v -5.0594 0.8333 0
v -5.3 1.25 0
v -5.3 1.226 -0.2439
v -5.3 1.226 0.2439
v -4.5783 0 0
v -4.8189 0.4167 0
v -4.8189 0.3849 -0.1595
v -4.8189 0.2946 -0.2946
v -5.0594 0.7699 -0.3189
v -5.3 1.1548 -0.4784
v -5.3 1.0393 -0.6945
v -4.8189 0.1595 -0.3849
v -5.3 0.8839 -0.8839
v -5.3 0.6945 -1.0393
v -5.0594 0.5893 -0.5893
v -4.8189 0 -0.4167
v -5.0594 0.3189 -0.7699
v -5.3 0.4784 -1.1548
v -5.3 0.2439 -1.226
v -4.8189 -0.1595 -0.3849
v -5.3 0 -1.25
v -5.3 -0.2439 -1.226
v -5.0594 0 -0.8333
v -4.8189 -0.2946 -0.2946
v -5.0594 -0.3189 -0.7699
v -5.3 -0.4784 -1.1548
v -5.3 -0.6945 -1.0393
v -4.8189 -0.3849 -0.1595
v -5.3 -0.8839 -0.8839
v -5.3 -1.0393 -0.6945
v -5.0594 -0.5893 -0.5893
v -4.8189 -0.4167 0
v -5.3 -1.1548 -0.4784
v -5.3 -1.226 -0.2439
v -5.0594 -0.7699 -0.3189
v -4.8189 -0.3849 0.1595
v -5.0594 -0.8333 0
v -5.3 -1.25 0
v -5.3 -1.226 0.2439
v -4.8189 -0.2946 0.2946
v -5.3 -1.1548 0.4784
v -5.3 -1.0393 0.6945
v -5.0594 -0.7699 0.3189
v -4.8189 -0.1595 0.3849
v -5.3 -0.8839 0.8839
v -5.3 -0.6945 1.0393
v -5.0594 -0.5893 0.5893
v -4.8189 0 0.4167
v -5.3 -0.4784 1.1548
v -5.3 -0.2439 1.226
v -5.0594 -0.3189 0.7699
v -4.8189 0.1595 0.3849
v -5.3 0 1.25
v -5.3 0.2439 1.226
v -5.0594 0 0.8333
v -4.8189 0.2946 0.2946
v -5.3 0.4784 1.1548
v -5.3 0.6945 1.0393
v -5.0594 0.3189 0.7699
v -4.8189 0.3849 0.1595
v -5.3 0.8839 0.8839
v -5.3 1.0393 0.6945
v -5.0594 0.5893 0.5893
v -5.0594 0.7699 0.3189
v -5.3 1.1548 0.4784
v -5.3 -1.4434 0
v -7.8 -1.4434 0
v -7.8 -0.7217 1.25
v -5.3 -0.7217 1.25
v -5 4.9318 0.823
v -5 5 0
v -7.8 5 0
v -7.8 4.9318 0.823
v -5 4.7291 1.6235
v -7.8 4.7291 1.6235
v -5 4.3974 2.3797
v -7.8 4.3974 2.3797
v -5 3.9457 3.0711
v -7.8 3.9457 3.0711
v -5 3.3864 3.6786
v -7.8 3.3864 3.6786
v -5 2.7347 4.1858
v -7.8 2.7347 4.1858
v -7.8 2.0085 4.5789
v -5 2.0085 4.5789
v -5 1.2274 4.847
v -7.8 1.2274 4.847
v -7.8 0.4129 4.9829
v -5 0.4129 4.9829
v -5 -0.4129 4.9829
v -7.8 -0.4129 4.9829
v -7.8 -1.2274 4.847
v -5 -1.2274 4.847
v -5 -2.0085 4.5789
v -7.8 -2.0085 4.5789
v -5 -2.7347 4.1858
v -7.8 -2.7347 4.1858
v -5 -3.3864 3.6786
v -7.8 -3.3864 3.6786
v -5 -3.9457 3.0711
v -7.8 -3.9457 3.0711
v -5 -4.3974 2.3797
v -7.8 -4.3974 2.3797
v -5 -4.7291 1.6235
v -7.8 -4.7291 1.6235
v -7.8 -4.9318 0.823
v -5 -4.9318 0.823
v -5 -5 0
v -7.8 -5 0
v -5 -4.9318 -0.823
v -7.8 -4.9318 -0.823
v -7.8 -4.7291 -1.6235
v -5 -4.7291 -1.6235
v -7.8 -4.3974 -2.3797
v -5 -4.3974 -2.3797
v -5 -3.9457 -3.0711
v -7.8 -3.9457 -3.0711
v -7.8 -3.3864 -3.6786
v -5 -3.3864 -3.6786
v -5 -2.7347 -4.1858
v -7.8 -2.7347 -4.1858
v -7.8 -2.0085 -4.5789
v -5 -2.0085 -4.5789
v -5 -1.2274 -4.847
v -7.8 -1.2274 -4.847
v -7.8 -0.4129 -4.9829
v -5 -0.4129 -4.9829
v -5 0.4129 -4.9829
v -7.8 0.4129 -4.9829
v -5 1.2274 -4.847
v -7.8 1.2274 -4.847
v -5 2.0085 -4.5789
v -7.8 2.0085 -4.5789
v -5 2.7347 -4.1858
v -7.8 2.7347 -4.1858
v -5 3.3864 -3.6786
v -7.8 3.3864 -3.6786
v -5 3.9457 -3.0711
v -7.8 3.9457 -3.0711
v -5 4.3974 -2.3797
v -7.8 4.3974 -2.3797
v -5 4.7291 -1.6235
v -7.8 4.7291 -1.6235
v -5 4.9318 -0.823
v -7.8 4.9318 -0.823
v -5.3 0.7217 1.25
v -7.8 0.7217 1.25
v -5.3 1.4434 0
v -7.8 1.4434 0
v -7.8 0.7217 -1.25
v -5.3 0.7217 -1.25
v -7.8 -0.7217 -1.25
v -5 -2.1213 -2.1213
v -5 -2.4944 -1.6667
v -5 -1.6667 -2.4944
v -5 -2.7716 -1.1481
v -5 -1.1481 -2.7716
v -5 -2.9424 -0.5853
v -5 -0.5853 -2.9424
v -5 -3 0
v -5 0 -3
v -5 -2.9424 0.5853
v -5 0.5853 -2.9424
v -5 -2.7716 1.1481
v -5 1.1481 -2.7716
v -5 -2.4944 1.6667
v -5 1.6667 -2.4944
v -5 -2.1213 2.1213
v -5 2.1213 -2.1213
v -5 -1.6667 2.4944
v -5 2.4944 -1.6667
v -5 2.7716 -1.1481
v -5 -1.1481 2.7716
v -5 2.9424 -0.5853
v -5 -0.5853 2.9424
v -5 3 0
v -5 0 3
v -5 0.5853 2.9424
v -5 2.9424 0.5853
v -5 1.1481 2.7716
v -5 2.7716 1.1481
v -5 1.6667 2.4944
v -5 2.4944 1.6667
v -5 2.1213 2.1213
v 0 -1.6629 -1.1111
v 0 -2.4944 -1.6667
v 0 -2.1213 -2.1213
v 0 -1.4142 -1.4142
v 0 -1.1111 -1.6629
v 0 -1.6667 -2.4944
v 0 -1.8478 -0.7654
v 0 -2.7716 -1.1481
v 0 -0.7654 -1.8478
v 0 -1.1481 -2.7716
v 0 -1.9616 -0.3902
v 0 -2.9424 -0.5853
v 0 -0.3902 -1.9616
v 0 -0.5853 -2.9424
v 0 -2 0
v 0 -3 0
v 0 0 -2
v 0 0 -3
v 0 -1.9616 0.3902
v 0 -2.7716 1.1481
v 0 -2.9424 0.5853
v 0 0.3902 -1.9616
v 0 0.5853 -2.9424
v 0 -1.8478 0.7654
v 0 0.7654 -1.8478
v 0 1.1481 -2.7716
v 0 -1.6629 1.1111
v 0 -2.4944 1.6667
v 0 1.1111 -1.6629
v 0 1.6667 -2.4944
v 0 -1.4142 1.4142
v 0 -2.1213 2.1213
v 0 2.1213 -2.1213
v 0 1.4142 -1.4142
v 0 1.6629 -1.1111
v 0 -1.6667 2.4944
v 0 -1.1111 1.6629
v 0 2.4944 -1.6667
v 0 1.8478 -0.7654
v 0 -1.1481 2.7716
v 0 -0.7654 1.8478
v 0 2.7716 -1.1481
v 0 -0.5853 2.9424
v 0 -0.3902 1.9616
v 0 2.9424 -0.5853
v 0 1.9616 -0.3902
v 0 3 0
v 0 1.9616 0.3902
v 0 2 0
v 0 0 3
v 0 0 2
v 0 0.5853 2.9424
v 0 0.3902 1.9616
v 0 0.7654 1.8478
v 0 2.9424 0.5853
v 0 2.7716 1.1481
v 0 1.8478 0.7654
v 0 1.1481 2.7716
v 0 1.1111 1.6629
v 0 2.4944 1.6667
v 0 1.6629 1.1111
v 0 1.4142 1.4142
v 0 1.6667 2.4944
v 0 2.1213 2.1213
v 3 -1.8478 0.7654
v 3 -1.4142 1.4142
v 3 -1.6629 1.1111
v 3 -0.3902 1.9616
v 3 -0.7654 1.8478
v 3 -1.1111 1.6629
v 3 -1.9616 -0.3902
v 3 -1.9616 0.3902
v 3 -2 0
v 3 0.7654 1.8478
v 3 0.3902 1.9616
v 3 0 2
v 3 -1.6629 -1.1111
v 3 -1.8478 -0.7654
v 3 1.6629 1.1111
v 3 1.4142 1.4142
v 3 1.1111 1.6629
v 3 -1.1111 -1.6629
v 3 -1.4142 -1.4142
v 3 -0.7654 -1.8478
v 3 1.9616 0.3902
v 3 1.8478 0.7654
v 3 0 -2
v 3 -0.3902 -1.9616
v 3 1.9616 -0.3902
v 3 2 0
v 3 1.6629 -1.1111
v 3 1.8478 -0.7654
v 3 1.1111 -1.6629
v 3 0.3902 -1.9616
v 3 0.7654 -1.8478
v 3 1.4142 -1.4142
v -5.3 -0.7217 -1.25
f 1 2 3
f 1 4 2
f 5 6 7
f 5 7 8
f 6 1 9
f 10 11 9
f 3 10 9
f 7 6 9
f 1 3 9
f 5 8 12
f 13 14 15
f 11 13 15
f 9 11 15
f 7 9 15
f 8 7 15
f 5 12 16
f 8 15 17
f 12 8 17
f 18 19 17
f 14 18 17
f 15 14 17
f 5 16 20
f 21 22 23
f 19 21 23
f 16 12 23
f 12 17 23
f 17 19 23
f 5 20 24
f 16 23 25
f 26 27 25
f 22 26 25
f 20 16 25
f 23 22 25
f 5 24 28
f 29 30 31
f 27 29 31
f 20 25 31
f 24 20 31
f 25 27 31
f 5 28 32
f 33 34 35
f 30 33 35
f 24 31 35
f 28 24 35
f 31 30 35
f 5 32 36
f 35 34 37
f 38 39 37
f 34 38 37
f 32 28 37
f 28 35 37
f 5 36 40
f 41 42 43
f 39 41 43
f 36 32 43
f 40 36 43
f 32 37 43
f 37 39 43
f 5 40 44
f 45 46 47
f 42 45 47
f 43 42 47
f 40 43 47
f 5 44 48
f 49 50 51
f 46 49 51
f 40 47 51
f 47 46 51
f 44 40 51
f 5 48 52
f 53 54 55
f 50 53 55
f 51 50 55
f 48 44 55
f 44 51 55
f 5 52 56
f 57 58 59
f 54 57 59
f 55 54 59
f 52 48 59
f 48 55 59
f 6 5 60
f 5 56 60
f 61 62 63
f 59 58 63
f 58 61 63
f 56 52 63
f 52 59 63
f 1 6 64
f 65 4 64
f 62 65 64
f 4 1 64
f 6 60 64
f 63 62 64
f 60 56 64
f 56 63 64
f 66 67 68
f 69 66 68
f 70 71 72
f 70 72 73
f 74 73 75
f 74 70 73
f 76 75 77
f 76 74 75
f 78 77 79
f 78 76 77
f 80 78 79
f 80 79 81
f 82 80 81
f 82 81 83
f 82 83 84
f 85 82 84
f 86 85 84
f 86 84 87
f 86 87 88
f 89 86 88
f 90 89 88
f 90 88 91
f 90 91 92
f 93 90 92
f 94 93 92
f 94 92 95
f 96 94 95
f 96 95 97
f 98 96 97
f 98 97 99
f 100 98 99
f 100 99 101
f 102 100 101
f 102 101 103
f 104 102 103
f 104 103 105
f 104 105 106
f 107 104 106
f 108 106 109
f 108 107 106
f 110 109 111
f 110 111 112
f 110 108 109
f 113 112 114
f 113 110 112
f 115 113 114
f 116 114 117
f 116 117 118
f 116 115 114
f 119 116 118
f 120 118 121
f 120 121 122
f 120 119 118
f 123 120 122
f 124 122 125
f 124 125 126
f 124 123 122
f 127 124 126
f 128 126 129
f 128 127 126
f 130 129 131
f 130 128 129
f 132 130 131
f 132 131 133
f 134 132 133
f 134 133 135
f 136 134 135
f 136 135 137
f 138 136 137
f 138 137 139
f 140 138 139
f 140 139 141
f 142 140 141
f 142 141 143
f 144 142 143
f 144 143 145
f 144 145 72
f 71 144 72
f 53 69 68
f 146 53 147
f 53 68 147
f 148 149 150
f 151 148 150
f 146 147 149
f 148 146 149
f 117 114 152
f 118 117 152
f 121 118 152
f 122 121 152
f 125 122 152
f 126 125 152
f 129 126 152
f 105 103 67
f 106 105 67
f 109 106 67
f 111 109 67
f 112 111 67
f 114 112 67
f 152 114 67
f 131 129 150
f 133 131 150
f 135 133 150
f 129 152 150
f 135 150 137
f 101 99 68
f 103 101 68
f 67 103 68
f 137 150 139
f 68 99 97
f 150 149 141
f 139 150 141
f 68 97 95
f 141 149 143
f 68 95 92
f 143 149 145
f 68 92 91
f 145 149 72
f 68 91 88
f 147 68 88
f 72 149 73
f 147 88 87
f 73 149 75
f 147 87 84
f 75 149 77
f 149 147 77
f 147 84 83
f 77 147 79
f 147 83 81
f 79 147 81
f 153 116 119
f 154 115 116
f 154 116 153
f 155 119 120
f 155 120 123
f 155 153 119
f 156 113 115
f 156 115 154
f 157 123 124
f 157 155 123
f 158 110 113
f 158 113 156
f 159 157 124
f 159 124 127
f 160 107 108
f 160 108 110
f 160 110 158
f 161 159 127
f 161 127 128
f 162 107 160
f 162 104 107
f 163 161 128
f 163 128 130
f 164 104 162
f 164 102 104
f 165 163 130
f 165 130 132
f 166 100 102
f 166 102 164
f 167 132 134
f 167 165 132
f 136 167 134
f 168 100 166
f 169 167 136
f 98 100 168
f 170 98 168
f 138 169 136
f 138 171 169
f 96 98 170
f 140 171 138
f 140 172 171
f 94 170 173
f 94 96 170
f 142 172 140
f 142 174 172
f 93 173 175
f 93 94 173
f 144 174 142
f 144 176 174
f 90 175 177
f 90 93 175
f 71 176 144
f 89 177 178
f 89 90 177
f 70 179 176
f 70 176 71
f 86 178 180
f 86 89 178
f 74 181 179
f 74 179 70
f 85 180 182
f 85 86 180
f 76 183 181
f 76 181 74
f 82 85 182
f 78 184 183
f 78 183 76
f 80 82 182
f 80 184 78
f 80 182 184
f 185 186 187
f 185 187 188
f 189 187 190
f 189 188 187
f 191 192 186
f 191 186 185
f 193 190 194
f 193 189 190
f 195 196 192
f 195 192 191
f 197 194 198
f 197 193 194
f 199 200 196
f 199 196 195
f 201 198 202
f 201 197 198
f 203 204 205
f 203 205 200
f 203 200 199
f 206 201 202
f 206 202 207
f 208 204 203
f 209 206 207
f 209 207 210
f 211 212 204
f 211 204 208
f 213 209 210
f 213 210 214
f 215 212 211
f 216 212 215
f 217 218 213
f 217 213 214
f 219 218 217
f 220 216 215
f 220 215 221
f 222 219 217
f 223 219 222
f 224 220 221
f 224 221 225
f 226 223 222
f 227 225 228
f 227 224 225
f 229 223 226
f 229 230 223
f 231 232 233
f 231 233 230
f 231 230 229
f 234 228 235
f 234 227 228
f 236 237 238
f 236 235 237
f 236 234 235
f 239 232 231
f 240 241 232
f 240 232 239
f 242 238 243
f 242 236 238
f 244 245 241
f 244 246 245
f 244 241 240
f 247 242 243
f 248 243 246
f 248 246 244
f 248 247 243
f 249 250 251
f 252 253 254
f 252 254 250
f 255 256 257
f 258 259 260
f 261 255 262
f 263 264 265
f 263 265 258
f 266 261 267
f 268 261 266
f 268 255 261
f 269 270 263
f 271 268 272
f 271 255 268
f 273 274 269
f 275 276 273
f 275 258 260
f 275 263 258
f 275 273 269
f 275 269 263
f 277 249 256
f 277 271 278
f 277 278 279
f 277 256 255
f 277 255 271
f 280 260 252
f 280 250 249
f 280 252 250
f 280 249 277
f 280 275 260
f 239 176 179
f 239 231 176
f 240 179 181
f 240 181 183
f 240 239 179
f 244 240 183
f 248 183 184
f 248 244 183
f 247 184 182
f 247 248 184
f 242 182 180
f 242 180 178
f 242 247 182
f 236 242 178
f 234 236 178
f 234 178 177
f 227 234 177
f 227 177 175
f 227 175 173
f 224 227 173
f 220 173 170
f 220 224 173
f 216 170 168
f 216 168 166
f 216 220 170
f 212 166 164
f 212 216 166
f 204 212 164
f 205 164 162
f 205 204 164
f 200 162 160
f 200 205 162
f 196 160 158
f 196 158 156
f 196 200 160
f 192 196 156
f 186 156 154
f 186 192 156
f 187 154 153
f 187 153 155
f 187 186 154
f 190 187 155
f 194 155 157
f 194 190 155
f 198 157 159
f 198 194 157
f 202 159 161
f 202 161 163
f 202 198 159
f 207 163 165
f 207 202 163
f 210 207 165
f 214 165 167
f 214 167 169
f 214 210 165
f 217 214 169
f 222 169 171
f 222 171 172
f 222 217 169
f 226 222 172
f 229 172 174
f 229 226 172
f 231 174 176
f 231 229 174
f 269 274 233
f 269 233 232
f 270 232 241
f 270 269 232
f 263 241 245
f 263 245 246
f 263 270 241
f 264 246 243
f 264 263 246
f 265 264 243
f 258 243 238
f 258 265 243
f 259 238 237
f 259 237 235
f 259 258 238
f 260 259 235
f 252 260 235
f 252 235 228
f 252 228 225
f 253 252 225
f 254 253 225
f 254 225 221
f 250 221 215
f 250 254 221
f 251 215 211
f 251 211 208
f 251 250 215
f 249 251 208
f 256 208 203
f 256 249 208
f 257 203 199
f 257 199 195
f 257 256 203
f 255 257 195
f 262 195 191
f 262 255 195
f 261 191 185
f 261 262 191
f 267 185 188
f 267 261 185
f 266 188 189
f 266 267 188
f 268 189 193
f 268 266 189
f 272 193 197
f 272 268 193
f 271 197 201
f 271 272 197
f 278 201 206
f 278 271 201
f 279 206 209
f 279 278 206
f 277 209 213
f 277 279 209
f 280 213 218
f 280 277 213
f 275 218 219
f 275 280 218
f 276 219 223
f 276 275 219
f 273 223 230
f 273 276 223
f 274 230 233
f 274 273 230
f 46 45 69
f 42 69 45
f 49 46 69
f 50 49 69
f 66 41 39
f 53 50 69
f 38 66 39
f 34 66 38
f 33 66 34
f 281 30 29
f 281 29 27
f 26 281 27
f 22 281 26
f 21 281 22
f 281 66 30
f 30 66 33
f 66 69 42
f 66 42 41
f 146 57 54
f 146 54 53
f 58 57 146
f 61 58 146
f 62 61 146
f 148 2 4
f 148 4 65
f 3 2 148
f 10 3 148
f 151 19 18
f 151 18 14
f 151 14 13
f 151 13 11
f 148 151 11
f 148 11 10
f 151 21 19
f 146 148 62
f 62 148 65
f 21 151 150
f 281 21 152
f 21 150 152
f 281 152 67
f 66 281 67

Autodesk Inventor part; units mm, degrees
ref_plane "YZ Plane" through (0, 0, 0) normal (1, 0, 0) x (0, 1, 0)
ref_plane "XZ Plane" through (0, 0, 0) normal (0, 1, 0) x (-1, 0, 0)
ref_plane "XY Plane" through (0, 0, 0) normal (0, 0, 1) x (1, 0, 0)
sketch "Sketch_1" plane through (0, 0, 0) normal (0, 0, 1) x (1, 0, 0)
  line L0 (5, 0) -> (-7.8, 0)
  line L1 (-7.8, 0) -> (-7.8, 5)
  line L2 (-7.8, 5) -> (-5, 5)
  line L3 (-5, 5) -> (-5, 3)
  line L4 (-5, 3) -> (0, 3)
  line L5 (0, 3) -> (0, 2)
  line L6 (0, 2) -> (4.5705, 2)
  line L7 (4.5705, 2) -> (5, 1.5705)
  line L8 (5, 1.5705) -> (5, 0)
  line L9 (5, 0) -> (-7.8, 0)
revolve "Revolution1" add sketch "Sketch_1" angle 360 about axis through (5, 0, 0) along (1, 0, 0)
thread "Thread1" size "M4x0.7" class "6g" standard "ISO Metric profile" length 3.3705
sketch "Sketch_2" plane through (-7.8, 0, 0) normal (-1, 0, 0) x (0, 1, 0)
  line L0 (-1.4434, 0) -> (-0.7217, -1.25)
  line L1 (-0.7217, -1.25) -> (0.7217, -1.25)
  line L2 (0.7217, -1.25) -> (1.4434, 0)
  line L3 (1.4434, 0) -> (0.7217, 1.25)
  line L4 (0.7217, 1.25) -> (-0.7217, 1.25)
  line L5 (-0.7217, 1.25) -> (-1.4434, 0)
extrude "Extrusion1" cut sketch "Sketch_2" against normal blind 2.5
sketch "Sketch_3" plane through (0, 0, 0) normal (0, 0, 1) x (1, 0, 0)
  line L0 (-4.5783, 0) -> (-5.3, 0)
  line L1 (-5.3, 0) -> (-5.3, 1.25)
  line L2 (-5.3, 1.25) -> (-4.5783, 0)
  line L3 (-4.5783, 0) -> (-5.3, 0)
revolve "Revolution2" cut sketch "Sketch_3" angle 360 about axis through (-4.5783, 0, 0) along (1, 0, 0)
sketch "スケッチ4" plane through (5, 0, 0) normal (1, 0, 0) x (0, 0, -1)
  circle A0 centre (0, 0) radius 5
extrude "押し出し2" cut sketch "スケッチ4" against normal blind 2
properties part number "DBS4-5-5_AddProc"
